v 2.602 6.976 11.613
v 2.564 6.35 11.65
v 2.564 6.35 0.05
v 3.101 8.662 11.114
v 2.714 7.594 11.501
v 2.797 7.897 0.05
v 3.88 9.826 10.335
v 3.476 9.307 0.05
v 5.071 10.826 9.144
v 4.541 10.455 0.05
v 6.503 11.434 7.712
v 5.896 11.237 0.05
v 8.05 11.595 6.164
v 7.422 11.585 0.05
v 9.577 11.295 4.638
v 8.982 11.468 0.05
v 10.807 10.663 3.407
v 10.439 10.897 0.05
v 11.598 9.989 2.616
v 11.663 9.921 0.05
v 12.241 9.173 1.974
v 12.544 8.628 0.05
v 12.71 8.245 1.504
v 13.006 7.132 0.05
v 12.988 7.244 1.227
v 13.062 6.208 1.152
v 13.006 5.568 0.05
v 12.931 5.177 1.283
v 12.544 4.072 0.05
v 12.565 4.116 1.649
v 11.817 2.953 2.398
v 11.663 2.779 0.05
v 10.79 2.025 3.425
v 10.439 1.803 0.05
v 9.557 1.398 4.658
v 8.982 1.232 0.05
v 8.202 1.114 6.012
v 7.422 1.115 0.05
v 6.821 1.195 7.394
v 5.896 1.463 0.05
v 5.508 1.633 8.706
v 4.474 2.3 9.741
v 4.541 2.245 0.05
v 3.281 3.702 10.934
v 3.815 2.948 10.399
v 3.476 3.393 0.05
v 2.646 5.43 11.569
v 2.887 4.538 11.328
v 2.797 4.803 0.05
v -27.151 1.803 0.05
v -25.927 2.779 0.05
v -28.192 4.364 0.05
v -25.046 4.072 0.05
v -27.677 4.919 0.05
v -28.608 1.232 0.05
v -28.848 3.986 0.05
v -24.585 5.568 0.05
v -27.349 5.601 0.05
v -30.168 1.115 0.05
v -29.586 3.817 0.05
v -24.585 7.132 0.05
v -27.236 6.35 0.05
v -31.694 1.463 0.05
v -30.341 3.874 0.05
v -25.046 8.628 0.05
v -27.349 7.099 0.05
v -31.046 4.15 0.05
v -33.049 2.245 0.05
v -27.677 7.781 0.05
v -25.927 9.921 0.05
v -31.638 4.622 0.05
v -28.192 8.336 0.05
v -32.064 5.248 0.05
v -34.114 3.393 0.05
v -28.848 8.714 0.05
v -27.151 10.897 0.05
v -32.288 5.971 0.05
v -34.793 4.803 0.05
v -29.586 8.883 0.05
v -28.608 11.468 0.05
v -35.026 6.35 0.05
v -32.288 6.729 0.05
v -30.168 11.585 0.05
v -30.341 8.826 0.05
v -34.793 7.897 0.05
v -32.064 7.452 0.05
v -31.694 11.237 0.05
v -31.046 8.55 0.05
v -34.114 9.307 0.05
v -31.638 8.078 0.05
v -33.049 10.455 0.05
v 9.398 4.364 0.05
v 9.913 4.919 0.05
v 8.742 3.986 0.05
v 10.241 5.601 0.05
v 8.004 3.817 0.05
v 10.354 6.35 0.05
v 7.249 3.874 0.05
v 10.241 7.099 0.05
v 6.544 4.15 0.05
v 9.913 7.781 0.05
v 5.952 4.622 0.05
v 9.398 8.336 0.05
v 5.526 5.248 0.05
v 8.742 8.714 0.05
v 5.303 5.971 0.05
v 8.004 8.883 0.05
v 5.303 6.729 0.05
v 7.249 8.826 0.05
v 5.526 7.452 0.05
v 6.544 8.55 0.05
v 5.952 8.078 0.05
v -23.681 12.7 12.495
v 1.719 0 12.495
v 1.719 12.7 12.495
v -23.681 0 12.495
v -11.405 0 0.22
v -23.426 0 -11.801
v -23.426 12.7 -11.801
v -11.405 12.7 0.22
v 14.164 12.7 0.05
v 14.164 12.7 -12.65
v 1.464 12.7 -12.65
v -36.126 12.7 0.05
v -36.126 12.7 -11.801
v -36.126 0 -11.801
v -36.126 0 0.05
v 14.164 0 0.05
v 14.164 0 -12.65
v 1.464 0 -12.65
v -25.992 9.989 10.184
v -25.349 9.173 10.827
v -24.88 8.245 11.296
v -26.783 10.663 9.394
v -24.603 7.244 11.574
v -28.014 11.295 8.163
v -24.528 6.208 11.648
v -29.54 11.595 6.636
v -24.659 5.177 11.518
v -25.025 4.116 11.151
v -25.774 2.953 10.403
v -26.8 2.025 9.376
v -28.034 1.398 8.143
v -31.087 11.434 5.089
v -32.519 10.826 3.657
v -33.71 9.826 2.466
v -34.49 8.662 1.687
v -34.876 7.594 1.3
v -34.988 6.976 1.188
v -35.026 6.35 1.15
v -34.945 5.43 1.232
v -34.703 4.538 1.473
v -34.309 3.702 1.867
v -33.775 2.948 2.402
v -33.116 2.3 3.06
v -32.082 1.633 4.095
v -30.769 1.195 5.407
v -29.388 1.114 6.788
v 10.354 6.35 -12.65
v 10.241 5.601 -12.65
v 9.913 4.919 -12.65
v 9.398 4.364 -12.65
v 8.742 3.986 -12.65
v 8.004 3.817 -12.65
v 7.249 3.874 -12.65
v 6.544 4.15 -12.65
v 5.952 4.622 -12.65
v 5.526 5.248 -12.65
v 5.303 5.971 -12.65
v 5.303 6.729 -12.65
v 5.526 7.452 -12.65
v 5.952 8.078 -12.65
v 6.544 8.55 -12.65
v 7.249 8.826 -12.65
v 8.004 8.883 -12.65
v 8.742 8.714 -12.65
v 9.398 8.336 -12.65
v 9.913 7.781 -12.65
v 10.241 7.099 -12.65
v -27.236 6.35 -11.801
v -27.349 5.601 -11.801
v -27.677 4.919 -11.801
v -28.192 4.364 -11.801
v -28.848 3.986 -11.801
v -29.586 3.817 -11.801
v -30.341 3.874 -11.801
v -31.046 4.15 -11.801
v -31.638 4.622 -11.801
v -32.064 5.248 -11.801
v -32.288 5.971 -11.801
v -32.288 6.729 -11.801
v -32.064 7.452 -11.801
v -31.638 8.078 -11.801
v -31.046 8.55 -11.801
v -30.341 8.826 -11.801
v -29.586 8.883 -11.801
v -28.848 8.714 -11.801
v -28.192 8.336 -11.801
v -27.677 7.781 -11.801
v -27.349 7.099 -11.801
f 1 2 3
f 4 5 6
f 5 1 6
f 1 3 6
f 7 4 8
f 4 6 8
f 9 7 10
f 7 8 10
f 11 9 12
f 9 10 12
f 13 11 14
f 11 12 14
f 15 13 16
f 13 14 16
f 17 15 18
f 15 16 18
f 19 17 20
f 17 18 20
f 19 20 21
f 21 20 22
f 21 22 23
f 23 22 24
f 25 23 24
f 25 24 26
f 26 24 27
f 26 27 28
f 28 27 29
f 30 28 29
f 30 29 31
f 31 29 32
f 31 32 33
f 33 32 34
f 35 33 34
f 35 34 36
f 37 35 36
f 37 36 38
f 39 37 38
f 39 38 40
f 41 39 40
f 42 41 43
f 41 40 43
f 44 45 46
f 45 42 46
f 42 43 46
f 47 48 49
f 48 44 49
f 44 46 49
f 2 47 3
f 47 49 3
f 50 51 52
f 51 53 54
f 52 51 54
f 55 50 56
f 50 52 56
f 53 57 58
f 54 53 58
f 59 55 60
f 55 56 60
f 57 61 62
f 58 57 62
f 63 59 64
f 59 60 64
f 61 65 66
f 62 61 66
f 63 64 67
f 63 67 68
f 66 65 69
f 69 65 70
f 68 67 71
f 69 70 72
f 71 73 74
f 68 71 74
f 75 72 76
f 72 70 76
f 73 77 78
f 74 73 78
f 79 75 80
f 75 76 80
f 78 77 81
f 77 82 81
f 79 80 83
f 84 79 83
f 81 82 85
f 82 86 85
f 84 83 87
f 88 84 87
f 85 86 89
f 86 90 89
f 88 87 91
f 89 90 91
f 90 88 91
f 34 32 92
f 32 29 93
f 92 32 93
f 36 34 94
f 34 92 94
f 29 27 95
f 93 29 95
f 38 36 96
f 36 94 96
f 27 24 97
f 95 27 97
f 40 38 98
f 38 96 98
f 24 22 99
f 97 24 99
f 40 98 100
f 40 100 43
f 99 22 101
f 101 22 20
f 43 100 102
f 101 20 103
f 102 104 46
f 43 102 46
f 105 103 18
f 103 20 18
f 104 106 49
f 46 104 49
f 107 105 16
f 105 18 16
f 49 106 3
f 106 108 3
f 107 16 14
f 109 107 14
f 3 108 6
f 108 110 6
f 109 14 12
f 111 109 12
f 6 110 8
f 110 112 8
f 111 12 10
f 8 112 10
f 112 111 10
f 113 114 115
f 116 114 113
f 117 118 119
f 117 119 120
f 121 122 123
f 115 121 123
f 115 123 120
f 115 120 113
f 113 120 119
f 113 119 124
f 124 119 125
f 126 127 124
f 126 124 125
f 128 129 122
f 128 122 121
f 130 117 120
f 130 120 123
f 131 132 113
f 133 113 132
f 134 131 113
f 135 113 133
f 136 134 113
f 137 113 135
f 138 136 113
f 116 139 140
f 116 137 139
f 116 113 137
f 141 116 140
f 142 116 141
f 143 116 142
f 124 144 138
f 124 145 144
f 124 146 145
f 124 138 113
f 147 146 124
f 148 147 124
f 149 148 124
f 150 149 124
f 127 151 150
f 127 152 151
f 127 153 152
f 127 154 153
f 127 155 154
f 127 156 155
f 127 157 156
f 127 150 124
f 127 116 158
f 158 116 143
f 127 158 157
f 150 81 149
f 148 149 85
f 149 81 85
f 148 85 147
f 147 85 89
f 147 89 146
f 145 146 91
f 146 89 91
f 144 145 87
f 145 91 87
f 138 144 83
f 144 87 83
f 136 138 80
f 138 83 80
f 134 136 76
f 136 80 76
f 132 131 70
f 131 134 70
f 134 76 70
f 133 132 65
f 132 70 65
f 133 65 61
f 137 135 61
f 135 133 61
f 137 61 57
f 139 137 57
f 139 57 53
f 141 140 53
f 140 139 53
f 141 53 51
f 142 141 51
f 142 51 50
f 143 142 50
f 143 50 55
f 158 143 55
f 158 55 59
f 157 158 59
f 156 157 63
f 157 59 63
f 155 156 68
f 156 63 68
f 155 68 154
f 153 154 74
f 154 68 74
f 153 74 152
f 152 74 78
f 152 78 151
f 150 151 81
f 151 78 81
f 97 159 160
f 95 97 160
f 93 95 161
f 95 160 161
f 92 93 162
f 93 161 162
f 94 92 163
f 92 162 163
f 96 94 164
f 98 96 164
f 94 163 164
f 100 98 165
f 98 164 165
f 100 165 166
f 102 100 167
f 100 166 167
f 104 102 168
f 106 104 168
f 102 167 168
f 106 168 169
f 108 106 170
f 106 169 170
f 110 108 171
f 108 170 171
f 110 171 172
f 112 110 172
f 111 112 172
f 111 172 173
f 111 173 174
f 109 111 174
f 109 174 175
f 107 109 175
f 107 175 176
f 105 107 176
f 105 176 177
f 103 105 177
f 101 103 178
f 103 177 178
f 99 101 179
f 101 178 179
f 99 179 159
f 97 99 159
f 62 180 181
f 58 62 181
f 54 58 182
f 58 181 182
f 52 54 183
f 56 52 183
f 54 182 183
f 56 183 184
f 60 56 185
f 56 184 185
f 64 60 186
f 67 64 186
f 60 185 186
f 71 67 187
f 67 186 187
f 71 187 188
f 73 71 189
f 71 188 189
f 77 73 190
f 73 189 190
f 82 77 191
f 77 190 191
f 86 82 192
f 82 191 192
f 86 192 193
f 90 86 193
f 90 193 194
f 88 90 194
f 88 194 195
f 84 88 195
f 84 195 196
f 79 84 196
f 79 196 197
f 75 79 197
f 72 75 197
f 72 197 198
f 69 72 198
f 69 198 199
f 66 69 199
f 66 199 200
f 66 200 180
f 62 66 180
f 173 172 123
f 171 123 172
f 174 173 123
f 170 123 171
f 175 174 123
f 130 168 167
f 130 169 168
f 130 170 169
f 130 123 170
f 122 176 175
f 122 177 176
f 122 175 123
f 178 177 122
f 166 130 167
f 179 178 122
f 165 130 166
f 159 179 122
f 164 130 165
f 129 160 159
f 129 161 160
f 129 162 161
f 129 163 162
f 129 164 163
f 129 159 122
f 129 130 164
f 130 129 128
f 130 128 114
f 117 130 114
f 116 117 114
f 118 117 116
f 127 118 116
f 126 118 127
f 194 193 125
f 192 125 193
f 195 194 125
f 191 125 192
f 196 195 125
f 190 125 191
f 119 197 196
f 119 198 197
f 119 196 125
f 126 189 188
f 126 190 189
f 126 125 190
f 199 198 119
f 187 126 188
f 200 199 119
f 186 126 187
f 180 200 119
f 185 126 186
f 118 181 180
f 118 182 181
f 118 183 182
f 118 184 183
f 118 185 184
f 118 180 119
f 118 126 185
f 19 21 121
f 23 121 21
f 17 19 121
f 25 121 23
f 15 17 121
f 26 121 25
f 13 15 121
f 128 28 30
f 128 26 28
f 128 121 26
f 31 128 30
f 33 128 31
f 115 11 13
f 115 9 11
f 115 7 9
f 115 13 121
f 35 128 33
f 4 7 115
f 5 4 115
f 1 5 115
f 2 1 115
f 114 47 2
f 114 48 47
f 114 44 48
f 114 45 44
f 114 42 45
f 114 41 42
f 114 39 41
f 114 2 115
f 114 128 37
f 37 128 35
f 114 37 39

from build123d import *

# Parameters (mm, degrees)
BOSS_EXTRUDE1_DEPTH = 12.7
CUT_EXTRUDE3_START  = 0.848528
SKETCH3_R           = 2.54
CUT_EXTRUDE3_DEPTH  = 12.7
SKETCH4_R           = 5.25
CUT_EXTRUDE4_DEPTH  = 12.7


with BuildPart() as part:
    # Sketch2 → Boss-Extrude1 (new body)
    with BuildSketch(Plane(origin=(0, 0, 0), x_dir=(1, 0, 0), z_dir=(0, 1, 0))):
        Polygon((-23.425952314, 11.801132082), (-11.405137034, -0.219683198), (1.464206384, 12.649660219), (14.164206384, 12.649660219), (14.164206384, -0.050339781), (1.719127035, -12.495419129), (-23.680872965, -12.495419129), (-36.125952314, -0.050339781), (-36.125952314, 11.801132082), align=None)
    extrude(amount=BOSS_EXTRUDE1_DEPTH)

    # Sketch3 → Cut-Extrude3 (cut)
    with BuildSketch(Plane(origin=(0, 0, -11.801132082), x_dir=(-1, 0, 0), z_dir=(0, 0, -1)).offset(CUT_EXTRUDE3_START)):
        with Locations(Location((-7.814206384, 6.35, 0), (0, 0, 180))):
            Circle(SKETCH3_R)
        with Locations(Location((29.775952314, 6.35, 0), (0, 0, 180))):
            Circle(SKETCH3_R)
    extrude(amount=-CUT_EXTRUDE3_DEPTH, mode=Mode.SUBTRACT)

    # Sketch4 → Cut-Extrude4 (cut)
    with BuildSketch(Plane(origin=(0, 0, 0.050339781), x_dir=(-1, 0, 0), z_dir=(0, 0, -1))):
        with Locations((-7.814206384, 6.35)):
            Circle(SKETCH4_R)
        with Locations((29.775952314, 6.35)):
            Circle(SKETCH4_R)
    extrude(amount=-CUT_EXTRUDE4_DEPTH, mode=Mode.SUBTRACT)


solid = part.part
